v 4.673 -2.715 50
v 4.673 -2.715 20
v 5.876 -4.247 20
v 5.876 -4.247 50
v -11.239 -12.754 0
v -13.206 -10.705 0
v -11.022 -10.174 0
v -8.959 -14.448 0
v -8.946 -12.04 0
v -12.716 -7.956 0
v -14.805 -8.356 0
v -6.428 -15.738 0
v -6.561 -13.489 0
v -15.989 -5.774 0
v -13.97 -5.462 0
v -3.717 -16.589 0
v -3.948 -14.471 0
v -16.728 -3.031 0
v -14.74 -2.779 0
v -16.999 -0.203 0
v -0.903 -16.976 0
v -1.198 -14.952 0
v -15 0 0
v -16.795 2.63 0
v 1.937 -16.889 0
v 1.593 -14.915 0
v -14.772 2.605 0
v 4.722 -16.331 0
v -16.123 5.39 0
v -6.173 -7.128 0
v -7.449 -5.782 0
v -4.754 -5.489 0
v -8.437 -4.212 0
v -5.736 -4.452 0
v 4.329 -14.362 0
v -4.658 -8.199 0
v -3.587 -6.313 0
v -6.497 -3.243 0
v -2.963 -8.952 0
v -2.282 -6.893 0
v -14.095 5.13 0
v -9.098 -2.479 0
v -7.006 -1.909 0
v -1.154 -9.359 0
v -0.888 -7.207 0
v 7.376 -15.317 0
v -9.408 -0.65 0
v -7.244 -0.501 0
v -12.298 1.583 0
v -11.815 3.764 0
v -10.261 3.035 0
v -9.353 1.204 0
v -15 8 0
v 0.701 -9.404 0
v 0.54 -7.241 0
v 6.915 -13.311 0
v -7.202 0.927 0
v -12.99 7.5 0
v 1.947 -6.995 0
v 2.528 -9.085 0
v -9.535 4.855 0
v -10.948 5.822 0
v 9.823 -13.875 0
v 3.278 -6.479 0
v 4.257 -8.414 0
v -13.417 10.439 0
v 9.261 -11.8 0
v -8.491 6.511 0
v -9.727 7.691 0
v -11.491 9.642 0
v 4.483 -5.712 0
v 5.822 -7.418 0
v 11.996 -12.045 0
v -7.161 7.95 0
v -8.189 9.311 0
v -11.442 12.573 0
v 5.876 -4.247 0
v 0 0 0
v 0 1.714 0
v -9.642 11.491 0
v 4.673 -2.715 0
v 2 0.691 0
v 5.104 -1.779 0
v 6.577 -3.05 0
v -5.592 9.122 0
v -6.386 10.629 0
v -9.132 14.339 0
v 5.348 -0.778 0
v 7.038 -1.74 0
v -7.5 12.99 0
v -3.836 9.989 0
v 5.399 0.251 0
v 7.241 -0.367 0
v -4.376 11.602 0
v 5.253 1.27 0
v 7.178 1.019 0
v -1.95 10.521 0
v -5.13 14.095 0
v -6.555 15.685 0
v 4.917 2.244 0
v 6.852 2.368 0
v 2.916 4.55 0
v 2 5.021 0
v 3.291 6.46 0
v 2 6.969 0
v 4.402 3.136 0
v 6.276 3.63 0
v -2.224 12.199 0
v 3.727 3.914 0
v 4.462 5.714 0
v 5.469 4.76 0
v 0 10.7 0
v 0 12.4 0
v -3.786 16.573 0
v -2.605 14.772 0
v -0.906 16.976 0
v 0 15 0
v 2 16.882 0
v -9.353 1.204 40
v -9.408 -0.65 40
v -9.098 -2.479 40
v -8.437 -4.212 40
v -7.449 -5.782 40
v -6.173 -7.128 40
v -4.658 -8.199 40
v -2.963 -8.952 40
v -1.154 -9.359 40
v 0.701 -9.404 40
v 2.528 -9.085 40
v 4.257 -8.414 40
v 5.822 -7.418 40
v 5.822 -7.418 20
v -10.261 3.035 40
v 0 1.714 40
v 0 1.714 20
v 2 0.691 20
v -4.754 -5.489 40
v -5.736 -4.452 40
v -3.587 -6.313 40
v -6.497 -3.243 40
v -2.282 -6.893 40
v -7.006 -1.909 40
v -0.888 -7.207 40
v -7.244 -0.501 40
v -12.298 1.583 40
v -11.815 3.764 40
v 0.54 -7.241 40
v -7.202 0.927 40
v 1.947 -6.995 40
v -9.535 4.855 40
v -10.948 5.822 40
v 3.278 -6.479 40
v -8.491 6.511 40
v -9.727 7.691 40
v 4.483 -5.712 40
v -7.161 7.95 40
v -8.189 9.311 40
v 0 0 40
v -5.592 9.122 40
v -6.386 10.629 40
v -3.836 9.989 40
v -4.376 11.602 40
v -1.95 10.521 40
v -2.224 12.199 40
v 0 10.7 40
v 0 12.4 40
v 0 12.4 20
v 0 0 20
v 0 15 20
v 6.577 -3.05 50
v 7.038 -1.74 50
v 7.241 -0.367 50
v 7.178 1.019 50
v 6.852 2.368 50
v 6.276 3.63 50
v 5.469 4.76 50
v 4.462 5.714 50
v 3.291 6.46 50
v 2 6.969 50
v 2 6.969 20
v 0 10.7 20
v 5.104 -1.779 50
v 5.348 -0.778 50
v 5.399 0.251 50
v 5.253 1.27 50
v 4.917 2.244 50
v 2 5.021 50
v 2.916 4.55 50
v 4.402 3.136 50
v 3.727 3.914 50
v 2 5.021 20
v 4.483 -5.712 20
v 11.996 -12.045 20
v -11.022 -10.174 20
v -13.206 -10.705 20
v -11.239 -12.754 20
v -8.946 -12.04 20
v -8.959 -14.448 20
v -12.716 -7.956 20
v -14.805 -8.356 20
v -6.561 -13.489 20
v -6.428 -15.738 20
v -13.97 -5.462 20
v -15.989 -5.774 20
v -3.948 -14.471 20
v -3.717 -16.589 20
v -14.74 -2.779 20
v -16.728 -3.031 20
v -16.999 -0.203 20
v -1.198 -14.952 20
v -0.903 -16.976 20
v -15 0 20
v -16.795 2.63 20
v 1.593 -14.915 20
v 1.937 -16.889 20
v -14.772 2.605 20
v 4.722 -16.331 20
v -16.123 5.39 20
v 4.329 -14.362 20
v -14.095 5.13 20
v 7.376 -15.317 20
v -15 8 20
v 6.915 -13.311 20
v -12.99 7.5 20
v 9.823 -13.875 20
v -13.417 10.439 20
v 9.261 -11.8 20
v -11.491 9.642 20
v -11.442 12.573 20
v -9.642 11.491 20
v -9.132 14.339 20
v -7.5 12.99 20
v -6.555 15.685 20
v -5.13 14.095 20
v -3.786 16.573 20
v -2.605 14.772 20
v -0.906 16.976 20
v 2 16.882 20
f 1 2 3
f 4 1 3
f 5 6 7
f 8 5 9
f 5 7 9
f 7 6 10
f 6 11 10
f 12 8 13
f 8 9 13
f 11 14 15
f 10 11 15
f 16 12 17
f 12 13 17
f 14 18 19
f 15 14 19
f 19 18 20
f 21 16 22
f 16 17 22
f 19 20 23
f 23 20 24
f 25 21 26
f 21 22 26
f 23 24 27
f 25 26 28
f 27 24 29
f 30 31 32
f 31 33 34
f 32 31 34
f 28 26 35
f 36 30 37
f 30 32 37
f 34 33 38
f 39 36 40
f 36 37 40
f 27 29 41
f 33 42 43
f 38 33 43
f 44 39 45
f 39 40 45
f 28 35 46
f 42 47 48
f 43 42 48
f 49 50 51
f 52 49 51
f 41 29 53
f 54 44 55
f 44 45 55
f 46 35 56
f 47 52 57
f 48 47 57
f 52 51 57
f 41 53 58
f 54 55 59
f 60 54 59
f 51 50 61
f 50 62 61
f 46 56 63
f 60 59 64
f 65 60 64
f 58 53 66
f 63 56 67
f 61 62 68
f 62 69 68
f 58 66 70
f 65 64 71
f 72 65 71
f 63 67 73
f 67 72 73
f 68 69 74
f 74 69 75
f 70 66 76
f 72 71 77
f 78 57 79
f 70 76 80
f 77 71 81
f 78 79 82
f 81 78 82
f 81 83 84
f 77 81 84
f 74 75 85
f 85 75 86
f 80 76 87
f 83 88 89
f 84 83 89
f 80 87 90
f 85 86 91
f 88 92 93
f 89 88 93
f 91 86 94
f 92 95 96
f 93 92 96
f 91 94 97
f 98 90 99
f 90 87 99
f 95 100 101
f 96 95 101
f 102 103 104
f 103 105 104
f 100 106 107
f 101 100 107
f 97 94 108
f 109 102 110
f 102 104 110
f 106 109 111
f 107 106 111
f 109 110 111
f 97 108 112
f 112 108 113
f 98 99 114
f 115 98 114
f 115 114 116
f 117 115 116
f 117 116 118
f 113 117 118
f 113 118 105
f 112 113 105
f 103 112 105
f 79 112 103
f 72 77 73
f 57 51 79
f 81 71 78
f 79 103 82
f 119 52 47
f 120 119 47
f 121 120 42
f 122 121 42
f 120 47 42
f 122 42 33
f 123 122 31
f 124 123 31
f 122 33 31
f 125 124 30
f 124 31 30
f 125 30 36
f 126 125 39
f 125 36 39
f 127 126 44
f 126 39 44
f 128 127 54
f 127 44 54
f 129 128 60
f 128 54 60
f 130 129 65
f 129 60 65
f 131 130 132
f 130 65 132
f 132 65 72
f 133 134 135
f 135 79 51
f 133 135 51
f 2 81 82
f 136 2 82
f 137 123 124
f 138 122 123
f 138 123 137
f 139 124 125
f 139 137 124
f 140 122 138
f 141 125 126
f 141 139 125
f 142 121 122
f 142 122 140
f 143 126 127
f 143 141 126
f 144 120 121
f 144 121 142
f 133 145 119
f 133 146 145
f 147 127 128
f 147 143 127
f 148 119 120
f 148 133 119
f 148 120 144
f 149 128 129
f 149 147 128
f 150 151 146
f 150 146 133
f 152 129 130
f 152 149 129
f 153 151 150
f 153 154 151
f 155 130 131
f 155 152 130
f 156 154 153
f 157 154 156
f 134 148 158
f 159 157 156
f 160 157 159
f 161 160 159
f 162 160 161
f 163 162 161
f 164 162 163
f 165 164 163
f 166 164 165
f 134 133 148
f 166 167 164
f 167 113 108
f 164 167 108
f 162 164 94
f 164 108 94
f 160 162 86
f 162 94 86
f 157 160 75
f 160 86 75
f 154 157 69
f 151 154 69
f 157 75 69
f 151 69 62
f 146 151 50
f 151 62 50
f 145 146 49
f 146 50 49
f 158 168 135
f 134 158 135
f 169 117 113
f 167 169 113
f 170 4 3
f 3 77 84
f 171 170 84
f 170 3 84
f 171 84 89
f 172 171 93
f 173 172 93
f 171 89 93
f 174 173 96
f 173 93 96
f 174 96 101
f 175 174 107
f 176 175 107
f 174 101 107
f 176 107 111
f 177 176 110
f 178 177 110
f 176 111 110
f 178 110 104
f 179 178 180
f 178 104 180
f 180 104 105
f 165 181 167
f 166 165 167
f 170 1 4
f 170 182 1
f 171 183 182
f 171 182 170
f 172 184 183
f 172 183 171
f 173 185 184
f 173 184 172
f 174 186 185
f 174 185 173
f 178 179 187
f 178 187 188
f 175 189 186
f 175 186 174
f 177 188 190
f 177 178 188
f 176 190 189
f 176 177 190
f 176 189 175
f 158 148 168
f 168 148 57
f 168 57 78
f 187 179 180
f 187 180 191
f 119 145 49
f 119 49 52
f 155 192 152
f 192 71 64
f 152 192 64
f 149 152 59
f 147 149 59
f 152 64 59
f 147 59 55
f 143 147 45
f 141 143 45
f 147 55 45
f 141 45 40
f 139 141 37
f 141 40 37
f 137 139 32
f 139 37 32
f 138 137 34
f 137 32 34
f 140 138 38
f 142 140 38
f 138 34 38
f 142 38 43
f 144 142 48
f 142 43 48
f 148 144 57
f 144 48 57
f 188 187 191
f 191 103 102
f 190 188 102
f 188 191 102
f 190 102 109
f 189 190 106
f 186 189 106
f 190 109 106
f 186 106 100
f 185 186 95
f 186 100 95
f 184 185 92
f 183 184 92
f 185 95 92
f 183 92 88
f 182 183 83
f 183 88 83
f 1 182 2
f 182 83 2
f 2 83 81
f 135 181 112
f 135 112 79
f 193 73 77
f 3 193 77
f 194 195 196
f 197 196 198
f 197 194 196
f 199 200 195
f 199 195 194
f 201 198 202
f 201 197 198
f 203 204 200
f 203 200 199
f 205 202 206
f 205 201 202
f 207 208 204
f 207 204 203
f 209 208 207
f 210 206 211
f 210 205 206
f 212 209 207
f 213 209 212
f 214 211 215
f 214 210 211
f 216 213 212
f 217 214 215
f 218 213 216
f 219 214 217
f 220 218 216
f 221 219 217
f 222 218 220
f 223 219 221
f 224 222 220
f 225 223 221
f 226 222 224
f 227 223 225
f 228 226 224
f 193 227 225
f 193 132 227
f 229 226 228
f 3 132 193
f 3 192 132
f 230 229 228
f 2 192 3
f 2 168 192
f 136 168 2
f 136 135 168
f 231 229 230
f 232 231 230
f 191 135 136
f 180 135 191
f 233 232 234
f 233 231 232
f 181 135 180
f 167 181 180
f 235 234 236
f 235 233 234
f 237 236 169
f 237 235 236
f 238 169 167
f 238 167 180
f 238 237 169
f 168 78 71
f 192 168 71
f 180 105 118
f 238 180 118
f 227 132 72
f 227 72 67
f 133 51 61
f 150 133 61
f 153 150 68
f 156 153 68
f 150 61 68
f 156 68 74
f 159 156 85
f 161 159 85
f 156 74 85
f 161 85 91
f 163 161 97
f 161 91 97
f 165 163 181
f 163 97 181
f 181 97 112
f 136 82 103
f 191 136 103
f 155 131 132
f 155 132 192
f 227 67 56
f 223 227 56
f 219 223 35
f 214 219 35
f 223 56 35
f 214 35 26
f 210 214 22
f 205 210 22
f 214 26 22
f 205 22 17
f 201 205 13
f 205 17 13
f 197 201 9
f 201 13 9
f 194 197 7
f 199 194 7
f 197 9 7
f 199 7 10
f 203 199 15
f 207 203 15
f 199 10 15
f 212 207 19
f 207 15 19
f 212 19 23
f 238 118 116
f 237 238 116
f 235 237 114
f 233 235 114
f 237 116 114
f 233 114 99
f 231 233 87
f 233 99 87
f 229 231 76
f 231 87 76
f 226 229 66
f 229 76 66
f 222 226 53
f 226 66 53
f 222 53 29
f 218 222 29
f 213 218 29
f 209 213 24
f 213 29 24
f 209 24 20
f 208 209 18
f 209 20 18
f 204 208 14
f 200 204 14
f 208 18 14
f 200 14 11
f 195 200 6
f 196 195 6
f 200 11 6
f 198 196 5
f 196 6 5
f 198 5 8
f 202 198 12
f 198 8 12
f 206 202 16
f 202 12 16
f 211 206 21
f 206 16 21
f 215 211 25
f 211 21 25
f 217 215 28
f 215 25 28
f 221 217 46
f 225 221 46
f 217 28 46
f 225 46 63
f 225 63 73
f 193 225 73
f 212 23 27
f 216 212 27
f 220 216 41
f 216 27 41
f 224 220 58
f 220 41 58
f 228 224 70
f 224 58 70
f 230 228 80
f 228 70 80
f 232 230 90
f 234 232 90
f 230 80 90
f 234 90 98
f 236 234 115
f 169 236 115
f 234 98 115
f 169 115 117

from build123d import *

# Parameters (mm, degrees)
F1_DEPTH = 20
F3_DEPTH = 25
F5_DEPTH = 50
F7_DEPTH = 40


with BuildPart() as f1:
    # F0 (on Top) → F1 (new body)
    with BuildSketch(Plane.XY):
        with BuildLine():
            ThreePointArc((2, 16.8819430161), (-7.8722441486, 15.0674407935), (-15, 8))
            Line((-15, 8), (-15, 1.73e-08))
            Line((-15, 1.73e-08), (-15, -8))
            ThreePointArc((-15, -8), (-2.5191792462, -16.8123090599), (11.9964033105, -12.0451777742))
            Line((11.9964033105, -12.0451777742), (2, 0.6911440225))
            Line((2, 0.6911440225), (2, 16.8819430161))
        make_face()
        with BuildLine():
            ThreePointArc((9.2611890072, -11.7995922884), (-6.5605702914, -13.4892148568), (-15, 1.73e-08))
            ThreePointArc((-15, 1.73e-08), (-10.6066017117, 10.6066017239), (0, 15))
            Line((0, 15), (0, 0))
            Line((0, 0), (9.2611890072, -11.7995922884))
        make_face(mode=Mode.SUBTRACT)
        with BuildLine():
            Line((-15, 1.73e-08), (-15, 8))
            ThreePointArc((-15, 8), (-17, 0), (-15, -8))
            Line((-15, -8), (-15, 1.73e-08))
        make_face()
    extrude(amount=F1_DEPTH)

    # F2 (on Top) → F3 (join)
    with BuildSketch(Plane.XY):
        with BuildLine():
            Line((-12.2984962158, 1.5833490395), (0, 0))
            Line((0, 0), (0, 1.7140309842))
            Line((0, 1.7140309842), (-10.2605423337, 3.0350071071))
            ThreePointArc((-10.2605423337, 3.0350071071), (-6.4037263169, 8.5721809582), (0, 10.6999998655))
            Line((0, 10.6999998655), (0, 12.4000001351))
            ThreePointArc((0, 12.4000001351), (-8.1892147074, 9.3111098064), (-12.2984962158, 1.5833490395))
        make_face()
    extrude(amount=F3_DEPTH)

    # F4 (on Top) → F5 (join)
    with BuildSketch(Plane.XY):
        with BuildLine():
            Line((4.6733382454, -2.7149306533), (5.8758648402, -4.2470582801))
            ThreePointArc((5.8758648402, -4.2470582801), (6.8524321368, 2.3680087553), (2, 6.968736733))
            Line((2, 6.968736733), (2, 5.0210495724))
            ThreePointArc((2, 5.0210495724), (5.1082979893, 1.7652848101), (4.6733382454, -2.7149306533))
        make_face()
    extrude(amount=F5_DEPTH)

    # F2 (on Top) + F6 (on Top) → F7 (join)
    with BuildSketch(Plane.XY):
        with BuildLine():
            Line((-12.2984962158, 1.5833490395), (0, 0))
            Line((0, 0), (0, 1.7140309842))
            Line((0, 1.7140309842), (-10.2605423337, 3.0350071071))
            ThreePointArc((-10.2605423337, 3.0350071071), (-6.4037263169, 8.5721809582), (0, 10.6999998655))
            Line((0, 10.6999998655), (0, 12.4000001351))
            ThreePointArc((0, 12.4000001351), (-8.1892147074, 9.3111098064), (-12.2984962158, 1.5833490395))
        make_face()
    with BuildSketch(Plane.XY):
        with BuildLine():
            ThreePointArc((-9.3527705449, 1.2041065834), (-4.6584728249, -8.1989524008), (5.8221775641, -7.4179807186))
            Line((5.8221775641, -7.4179807186), (4.4831560663, -5.7119462422))
            ThreePointArc((4.4831560663, -5.7119462422), (-3.5870875587, -6.3133050802), (-7.2017607749, 0.9271784782))
            Line((-7.2017607749, 0.9271784782), (-9.3527705449, 1.2041065834))
        make_face()
    extrude(amount=F7_DEPTH)


solid = f1.part
